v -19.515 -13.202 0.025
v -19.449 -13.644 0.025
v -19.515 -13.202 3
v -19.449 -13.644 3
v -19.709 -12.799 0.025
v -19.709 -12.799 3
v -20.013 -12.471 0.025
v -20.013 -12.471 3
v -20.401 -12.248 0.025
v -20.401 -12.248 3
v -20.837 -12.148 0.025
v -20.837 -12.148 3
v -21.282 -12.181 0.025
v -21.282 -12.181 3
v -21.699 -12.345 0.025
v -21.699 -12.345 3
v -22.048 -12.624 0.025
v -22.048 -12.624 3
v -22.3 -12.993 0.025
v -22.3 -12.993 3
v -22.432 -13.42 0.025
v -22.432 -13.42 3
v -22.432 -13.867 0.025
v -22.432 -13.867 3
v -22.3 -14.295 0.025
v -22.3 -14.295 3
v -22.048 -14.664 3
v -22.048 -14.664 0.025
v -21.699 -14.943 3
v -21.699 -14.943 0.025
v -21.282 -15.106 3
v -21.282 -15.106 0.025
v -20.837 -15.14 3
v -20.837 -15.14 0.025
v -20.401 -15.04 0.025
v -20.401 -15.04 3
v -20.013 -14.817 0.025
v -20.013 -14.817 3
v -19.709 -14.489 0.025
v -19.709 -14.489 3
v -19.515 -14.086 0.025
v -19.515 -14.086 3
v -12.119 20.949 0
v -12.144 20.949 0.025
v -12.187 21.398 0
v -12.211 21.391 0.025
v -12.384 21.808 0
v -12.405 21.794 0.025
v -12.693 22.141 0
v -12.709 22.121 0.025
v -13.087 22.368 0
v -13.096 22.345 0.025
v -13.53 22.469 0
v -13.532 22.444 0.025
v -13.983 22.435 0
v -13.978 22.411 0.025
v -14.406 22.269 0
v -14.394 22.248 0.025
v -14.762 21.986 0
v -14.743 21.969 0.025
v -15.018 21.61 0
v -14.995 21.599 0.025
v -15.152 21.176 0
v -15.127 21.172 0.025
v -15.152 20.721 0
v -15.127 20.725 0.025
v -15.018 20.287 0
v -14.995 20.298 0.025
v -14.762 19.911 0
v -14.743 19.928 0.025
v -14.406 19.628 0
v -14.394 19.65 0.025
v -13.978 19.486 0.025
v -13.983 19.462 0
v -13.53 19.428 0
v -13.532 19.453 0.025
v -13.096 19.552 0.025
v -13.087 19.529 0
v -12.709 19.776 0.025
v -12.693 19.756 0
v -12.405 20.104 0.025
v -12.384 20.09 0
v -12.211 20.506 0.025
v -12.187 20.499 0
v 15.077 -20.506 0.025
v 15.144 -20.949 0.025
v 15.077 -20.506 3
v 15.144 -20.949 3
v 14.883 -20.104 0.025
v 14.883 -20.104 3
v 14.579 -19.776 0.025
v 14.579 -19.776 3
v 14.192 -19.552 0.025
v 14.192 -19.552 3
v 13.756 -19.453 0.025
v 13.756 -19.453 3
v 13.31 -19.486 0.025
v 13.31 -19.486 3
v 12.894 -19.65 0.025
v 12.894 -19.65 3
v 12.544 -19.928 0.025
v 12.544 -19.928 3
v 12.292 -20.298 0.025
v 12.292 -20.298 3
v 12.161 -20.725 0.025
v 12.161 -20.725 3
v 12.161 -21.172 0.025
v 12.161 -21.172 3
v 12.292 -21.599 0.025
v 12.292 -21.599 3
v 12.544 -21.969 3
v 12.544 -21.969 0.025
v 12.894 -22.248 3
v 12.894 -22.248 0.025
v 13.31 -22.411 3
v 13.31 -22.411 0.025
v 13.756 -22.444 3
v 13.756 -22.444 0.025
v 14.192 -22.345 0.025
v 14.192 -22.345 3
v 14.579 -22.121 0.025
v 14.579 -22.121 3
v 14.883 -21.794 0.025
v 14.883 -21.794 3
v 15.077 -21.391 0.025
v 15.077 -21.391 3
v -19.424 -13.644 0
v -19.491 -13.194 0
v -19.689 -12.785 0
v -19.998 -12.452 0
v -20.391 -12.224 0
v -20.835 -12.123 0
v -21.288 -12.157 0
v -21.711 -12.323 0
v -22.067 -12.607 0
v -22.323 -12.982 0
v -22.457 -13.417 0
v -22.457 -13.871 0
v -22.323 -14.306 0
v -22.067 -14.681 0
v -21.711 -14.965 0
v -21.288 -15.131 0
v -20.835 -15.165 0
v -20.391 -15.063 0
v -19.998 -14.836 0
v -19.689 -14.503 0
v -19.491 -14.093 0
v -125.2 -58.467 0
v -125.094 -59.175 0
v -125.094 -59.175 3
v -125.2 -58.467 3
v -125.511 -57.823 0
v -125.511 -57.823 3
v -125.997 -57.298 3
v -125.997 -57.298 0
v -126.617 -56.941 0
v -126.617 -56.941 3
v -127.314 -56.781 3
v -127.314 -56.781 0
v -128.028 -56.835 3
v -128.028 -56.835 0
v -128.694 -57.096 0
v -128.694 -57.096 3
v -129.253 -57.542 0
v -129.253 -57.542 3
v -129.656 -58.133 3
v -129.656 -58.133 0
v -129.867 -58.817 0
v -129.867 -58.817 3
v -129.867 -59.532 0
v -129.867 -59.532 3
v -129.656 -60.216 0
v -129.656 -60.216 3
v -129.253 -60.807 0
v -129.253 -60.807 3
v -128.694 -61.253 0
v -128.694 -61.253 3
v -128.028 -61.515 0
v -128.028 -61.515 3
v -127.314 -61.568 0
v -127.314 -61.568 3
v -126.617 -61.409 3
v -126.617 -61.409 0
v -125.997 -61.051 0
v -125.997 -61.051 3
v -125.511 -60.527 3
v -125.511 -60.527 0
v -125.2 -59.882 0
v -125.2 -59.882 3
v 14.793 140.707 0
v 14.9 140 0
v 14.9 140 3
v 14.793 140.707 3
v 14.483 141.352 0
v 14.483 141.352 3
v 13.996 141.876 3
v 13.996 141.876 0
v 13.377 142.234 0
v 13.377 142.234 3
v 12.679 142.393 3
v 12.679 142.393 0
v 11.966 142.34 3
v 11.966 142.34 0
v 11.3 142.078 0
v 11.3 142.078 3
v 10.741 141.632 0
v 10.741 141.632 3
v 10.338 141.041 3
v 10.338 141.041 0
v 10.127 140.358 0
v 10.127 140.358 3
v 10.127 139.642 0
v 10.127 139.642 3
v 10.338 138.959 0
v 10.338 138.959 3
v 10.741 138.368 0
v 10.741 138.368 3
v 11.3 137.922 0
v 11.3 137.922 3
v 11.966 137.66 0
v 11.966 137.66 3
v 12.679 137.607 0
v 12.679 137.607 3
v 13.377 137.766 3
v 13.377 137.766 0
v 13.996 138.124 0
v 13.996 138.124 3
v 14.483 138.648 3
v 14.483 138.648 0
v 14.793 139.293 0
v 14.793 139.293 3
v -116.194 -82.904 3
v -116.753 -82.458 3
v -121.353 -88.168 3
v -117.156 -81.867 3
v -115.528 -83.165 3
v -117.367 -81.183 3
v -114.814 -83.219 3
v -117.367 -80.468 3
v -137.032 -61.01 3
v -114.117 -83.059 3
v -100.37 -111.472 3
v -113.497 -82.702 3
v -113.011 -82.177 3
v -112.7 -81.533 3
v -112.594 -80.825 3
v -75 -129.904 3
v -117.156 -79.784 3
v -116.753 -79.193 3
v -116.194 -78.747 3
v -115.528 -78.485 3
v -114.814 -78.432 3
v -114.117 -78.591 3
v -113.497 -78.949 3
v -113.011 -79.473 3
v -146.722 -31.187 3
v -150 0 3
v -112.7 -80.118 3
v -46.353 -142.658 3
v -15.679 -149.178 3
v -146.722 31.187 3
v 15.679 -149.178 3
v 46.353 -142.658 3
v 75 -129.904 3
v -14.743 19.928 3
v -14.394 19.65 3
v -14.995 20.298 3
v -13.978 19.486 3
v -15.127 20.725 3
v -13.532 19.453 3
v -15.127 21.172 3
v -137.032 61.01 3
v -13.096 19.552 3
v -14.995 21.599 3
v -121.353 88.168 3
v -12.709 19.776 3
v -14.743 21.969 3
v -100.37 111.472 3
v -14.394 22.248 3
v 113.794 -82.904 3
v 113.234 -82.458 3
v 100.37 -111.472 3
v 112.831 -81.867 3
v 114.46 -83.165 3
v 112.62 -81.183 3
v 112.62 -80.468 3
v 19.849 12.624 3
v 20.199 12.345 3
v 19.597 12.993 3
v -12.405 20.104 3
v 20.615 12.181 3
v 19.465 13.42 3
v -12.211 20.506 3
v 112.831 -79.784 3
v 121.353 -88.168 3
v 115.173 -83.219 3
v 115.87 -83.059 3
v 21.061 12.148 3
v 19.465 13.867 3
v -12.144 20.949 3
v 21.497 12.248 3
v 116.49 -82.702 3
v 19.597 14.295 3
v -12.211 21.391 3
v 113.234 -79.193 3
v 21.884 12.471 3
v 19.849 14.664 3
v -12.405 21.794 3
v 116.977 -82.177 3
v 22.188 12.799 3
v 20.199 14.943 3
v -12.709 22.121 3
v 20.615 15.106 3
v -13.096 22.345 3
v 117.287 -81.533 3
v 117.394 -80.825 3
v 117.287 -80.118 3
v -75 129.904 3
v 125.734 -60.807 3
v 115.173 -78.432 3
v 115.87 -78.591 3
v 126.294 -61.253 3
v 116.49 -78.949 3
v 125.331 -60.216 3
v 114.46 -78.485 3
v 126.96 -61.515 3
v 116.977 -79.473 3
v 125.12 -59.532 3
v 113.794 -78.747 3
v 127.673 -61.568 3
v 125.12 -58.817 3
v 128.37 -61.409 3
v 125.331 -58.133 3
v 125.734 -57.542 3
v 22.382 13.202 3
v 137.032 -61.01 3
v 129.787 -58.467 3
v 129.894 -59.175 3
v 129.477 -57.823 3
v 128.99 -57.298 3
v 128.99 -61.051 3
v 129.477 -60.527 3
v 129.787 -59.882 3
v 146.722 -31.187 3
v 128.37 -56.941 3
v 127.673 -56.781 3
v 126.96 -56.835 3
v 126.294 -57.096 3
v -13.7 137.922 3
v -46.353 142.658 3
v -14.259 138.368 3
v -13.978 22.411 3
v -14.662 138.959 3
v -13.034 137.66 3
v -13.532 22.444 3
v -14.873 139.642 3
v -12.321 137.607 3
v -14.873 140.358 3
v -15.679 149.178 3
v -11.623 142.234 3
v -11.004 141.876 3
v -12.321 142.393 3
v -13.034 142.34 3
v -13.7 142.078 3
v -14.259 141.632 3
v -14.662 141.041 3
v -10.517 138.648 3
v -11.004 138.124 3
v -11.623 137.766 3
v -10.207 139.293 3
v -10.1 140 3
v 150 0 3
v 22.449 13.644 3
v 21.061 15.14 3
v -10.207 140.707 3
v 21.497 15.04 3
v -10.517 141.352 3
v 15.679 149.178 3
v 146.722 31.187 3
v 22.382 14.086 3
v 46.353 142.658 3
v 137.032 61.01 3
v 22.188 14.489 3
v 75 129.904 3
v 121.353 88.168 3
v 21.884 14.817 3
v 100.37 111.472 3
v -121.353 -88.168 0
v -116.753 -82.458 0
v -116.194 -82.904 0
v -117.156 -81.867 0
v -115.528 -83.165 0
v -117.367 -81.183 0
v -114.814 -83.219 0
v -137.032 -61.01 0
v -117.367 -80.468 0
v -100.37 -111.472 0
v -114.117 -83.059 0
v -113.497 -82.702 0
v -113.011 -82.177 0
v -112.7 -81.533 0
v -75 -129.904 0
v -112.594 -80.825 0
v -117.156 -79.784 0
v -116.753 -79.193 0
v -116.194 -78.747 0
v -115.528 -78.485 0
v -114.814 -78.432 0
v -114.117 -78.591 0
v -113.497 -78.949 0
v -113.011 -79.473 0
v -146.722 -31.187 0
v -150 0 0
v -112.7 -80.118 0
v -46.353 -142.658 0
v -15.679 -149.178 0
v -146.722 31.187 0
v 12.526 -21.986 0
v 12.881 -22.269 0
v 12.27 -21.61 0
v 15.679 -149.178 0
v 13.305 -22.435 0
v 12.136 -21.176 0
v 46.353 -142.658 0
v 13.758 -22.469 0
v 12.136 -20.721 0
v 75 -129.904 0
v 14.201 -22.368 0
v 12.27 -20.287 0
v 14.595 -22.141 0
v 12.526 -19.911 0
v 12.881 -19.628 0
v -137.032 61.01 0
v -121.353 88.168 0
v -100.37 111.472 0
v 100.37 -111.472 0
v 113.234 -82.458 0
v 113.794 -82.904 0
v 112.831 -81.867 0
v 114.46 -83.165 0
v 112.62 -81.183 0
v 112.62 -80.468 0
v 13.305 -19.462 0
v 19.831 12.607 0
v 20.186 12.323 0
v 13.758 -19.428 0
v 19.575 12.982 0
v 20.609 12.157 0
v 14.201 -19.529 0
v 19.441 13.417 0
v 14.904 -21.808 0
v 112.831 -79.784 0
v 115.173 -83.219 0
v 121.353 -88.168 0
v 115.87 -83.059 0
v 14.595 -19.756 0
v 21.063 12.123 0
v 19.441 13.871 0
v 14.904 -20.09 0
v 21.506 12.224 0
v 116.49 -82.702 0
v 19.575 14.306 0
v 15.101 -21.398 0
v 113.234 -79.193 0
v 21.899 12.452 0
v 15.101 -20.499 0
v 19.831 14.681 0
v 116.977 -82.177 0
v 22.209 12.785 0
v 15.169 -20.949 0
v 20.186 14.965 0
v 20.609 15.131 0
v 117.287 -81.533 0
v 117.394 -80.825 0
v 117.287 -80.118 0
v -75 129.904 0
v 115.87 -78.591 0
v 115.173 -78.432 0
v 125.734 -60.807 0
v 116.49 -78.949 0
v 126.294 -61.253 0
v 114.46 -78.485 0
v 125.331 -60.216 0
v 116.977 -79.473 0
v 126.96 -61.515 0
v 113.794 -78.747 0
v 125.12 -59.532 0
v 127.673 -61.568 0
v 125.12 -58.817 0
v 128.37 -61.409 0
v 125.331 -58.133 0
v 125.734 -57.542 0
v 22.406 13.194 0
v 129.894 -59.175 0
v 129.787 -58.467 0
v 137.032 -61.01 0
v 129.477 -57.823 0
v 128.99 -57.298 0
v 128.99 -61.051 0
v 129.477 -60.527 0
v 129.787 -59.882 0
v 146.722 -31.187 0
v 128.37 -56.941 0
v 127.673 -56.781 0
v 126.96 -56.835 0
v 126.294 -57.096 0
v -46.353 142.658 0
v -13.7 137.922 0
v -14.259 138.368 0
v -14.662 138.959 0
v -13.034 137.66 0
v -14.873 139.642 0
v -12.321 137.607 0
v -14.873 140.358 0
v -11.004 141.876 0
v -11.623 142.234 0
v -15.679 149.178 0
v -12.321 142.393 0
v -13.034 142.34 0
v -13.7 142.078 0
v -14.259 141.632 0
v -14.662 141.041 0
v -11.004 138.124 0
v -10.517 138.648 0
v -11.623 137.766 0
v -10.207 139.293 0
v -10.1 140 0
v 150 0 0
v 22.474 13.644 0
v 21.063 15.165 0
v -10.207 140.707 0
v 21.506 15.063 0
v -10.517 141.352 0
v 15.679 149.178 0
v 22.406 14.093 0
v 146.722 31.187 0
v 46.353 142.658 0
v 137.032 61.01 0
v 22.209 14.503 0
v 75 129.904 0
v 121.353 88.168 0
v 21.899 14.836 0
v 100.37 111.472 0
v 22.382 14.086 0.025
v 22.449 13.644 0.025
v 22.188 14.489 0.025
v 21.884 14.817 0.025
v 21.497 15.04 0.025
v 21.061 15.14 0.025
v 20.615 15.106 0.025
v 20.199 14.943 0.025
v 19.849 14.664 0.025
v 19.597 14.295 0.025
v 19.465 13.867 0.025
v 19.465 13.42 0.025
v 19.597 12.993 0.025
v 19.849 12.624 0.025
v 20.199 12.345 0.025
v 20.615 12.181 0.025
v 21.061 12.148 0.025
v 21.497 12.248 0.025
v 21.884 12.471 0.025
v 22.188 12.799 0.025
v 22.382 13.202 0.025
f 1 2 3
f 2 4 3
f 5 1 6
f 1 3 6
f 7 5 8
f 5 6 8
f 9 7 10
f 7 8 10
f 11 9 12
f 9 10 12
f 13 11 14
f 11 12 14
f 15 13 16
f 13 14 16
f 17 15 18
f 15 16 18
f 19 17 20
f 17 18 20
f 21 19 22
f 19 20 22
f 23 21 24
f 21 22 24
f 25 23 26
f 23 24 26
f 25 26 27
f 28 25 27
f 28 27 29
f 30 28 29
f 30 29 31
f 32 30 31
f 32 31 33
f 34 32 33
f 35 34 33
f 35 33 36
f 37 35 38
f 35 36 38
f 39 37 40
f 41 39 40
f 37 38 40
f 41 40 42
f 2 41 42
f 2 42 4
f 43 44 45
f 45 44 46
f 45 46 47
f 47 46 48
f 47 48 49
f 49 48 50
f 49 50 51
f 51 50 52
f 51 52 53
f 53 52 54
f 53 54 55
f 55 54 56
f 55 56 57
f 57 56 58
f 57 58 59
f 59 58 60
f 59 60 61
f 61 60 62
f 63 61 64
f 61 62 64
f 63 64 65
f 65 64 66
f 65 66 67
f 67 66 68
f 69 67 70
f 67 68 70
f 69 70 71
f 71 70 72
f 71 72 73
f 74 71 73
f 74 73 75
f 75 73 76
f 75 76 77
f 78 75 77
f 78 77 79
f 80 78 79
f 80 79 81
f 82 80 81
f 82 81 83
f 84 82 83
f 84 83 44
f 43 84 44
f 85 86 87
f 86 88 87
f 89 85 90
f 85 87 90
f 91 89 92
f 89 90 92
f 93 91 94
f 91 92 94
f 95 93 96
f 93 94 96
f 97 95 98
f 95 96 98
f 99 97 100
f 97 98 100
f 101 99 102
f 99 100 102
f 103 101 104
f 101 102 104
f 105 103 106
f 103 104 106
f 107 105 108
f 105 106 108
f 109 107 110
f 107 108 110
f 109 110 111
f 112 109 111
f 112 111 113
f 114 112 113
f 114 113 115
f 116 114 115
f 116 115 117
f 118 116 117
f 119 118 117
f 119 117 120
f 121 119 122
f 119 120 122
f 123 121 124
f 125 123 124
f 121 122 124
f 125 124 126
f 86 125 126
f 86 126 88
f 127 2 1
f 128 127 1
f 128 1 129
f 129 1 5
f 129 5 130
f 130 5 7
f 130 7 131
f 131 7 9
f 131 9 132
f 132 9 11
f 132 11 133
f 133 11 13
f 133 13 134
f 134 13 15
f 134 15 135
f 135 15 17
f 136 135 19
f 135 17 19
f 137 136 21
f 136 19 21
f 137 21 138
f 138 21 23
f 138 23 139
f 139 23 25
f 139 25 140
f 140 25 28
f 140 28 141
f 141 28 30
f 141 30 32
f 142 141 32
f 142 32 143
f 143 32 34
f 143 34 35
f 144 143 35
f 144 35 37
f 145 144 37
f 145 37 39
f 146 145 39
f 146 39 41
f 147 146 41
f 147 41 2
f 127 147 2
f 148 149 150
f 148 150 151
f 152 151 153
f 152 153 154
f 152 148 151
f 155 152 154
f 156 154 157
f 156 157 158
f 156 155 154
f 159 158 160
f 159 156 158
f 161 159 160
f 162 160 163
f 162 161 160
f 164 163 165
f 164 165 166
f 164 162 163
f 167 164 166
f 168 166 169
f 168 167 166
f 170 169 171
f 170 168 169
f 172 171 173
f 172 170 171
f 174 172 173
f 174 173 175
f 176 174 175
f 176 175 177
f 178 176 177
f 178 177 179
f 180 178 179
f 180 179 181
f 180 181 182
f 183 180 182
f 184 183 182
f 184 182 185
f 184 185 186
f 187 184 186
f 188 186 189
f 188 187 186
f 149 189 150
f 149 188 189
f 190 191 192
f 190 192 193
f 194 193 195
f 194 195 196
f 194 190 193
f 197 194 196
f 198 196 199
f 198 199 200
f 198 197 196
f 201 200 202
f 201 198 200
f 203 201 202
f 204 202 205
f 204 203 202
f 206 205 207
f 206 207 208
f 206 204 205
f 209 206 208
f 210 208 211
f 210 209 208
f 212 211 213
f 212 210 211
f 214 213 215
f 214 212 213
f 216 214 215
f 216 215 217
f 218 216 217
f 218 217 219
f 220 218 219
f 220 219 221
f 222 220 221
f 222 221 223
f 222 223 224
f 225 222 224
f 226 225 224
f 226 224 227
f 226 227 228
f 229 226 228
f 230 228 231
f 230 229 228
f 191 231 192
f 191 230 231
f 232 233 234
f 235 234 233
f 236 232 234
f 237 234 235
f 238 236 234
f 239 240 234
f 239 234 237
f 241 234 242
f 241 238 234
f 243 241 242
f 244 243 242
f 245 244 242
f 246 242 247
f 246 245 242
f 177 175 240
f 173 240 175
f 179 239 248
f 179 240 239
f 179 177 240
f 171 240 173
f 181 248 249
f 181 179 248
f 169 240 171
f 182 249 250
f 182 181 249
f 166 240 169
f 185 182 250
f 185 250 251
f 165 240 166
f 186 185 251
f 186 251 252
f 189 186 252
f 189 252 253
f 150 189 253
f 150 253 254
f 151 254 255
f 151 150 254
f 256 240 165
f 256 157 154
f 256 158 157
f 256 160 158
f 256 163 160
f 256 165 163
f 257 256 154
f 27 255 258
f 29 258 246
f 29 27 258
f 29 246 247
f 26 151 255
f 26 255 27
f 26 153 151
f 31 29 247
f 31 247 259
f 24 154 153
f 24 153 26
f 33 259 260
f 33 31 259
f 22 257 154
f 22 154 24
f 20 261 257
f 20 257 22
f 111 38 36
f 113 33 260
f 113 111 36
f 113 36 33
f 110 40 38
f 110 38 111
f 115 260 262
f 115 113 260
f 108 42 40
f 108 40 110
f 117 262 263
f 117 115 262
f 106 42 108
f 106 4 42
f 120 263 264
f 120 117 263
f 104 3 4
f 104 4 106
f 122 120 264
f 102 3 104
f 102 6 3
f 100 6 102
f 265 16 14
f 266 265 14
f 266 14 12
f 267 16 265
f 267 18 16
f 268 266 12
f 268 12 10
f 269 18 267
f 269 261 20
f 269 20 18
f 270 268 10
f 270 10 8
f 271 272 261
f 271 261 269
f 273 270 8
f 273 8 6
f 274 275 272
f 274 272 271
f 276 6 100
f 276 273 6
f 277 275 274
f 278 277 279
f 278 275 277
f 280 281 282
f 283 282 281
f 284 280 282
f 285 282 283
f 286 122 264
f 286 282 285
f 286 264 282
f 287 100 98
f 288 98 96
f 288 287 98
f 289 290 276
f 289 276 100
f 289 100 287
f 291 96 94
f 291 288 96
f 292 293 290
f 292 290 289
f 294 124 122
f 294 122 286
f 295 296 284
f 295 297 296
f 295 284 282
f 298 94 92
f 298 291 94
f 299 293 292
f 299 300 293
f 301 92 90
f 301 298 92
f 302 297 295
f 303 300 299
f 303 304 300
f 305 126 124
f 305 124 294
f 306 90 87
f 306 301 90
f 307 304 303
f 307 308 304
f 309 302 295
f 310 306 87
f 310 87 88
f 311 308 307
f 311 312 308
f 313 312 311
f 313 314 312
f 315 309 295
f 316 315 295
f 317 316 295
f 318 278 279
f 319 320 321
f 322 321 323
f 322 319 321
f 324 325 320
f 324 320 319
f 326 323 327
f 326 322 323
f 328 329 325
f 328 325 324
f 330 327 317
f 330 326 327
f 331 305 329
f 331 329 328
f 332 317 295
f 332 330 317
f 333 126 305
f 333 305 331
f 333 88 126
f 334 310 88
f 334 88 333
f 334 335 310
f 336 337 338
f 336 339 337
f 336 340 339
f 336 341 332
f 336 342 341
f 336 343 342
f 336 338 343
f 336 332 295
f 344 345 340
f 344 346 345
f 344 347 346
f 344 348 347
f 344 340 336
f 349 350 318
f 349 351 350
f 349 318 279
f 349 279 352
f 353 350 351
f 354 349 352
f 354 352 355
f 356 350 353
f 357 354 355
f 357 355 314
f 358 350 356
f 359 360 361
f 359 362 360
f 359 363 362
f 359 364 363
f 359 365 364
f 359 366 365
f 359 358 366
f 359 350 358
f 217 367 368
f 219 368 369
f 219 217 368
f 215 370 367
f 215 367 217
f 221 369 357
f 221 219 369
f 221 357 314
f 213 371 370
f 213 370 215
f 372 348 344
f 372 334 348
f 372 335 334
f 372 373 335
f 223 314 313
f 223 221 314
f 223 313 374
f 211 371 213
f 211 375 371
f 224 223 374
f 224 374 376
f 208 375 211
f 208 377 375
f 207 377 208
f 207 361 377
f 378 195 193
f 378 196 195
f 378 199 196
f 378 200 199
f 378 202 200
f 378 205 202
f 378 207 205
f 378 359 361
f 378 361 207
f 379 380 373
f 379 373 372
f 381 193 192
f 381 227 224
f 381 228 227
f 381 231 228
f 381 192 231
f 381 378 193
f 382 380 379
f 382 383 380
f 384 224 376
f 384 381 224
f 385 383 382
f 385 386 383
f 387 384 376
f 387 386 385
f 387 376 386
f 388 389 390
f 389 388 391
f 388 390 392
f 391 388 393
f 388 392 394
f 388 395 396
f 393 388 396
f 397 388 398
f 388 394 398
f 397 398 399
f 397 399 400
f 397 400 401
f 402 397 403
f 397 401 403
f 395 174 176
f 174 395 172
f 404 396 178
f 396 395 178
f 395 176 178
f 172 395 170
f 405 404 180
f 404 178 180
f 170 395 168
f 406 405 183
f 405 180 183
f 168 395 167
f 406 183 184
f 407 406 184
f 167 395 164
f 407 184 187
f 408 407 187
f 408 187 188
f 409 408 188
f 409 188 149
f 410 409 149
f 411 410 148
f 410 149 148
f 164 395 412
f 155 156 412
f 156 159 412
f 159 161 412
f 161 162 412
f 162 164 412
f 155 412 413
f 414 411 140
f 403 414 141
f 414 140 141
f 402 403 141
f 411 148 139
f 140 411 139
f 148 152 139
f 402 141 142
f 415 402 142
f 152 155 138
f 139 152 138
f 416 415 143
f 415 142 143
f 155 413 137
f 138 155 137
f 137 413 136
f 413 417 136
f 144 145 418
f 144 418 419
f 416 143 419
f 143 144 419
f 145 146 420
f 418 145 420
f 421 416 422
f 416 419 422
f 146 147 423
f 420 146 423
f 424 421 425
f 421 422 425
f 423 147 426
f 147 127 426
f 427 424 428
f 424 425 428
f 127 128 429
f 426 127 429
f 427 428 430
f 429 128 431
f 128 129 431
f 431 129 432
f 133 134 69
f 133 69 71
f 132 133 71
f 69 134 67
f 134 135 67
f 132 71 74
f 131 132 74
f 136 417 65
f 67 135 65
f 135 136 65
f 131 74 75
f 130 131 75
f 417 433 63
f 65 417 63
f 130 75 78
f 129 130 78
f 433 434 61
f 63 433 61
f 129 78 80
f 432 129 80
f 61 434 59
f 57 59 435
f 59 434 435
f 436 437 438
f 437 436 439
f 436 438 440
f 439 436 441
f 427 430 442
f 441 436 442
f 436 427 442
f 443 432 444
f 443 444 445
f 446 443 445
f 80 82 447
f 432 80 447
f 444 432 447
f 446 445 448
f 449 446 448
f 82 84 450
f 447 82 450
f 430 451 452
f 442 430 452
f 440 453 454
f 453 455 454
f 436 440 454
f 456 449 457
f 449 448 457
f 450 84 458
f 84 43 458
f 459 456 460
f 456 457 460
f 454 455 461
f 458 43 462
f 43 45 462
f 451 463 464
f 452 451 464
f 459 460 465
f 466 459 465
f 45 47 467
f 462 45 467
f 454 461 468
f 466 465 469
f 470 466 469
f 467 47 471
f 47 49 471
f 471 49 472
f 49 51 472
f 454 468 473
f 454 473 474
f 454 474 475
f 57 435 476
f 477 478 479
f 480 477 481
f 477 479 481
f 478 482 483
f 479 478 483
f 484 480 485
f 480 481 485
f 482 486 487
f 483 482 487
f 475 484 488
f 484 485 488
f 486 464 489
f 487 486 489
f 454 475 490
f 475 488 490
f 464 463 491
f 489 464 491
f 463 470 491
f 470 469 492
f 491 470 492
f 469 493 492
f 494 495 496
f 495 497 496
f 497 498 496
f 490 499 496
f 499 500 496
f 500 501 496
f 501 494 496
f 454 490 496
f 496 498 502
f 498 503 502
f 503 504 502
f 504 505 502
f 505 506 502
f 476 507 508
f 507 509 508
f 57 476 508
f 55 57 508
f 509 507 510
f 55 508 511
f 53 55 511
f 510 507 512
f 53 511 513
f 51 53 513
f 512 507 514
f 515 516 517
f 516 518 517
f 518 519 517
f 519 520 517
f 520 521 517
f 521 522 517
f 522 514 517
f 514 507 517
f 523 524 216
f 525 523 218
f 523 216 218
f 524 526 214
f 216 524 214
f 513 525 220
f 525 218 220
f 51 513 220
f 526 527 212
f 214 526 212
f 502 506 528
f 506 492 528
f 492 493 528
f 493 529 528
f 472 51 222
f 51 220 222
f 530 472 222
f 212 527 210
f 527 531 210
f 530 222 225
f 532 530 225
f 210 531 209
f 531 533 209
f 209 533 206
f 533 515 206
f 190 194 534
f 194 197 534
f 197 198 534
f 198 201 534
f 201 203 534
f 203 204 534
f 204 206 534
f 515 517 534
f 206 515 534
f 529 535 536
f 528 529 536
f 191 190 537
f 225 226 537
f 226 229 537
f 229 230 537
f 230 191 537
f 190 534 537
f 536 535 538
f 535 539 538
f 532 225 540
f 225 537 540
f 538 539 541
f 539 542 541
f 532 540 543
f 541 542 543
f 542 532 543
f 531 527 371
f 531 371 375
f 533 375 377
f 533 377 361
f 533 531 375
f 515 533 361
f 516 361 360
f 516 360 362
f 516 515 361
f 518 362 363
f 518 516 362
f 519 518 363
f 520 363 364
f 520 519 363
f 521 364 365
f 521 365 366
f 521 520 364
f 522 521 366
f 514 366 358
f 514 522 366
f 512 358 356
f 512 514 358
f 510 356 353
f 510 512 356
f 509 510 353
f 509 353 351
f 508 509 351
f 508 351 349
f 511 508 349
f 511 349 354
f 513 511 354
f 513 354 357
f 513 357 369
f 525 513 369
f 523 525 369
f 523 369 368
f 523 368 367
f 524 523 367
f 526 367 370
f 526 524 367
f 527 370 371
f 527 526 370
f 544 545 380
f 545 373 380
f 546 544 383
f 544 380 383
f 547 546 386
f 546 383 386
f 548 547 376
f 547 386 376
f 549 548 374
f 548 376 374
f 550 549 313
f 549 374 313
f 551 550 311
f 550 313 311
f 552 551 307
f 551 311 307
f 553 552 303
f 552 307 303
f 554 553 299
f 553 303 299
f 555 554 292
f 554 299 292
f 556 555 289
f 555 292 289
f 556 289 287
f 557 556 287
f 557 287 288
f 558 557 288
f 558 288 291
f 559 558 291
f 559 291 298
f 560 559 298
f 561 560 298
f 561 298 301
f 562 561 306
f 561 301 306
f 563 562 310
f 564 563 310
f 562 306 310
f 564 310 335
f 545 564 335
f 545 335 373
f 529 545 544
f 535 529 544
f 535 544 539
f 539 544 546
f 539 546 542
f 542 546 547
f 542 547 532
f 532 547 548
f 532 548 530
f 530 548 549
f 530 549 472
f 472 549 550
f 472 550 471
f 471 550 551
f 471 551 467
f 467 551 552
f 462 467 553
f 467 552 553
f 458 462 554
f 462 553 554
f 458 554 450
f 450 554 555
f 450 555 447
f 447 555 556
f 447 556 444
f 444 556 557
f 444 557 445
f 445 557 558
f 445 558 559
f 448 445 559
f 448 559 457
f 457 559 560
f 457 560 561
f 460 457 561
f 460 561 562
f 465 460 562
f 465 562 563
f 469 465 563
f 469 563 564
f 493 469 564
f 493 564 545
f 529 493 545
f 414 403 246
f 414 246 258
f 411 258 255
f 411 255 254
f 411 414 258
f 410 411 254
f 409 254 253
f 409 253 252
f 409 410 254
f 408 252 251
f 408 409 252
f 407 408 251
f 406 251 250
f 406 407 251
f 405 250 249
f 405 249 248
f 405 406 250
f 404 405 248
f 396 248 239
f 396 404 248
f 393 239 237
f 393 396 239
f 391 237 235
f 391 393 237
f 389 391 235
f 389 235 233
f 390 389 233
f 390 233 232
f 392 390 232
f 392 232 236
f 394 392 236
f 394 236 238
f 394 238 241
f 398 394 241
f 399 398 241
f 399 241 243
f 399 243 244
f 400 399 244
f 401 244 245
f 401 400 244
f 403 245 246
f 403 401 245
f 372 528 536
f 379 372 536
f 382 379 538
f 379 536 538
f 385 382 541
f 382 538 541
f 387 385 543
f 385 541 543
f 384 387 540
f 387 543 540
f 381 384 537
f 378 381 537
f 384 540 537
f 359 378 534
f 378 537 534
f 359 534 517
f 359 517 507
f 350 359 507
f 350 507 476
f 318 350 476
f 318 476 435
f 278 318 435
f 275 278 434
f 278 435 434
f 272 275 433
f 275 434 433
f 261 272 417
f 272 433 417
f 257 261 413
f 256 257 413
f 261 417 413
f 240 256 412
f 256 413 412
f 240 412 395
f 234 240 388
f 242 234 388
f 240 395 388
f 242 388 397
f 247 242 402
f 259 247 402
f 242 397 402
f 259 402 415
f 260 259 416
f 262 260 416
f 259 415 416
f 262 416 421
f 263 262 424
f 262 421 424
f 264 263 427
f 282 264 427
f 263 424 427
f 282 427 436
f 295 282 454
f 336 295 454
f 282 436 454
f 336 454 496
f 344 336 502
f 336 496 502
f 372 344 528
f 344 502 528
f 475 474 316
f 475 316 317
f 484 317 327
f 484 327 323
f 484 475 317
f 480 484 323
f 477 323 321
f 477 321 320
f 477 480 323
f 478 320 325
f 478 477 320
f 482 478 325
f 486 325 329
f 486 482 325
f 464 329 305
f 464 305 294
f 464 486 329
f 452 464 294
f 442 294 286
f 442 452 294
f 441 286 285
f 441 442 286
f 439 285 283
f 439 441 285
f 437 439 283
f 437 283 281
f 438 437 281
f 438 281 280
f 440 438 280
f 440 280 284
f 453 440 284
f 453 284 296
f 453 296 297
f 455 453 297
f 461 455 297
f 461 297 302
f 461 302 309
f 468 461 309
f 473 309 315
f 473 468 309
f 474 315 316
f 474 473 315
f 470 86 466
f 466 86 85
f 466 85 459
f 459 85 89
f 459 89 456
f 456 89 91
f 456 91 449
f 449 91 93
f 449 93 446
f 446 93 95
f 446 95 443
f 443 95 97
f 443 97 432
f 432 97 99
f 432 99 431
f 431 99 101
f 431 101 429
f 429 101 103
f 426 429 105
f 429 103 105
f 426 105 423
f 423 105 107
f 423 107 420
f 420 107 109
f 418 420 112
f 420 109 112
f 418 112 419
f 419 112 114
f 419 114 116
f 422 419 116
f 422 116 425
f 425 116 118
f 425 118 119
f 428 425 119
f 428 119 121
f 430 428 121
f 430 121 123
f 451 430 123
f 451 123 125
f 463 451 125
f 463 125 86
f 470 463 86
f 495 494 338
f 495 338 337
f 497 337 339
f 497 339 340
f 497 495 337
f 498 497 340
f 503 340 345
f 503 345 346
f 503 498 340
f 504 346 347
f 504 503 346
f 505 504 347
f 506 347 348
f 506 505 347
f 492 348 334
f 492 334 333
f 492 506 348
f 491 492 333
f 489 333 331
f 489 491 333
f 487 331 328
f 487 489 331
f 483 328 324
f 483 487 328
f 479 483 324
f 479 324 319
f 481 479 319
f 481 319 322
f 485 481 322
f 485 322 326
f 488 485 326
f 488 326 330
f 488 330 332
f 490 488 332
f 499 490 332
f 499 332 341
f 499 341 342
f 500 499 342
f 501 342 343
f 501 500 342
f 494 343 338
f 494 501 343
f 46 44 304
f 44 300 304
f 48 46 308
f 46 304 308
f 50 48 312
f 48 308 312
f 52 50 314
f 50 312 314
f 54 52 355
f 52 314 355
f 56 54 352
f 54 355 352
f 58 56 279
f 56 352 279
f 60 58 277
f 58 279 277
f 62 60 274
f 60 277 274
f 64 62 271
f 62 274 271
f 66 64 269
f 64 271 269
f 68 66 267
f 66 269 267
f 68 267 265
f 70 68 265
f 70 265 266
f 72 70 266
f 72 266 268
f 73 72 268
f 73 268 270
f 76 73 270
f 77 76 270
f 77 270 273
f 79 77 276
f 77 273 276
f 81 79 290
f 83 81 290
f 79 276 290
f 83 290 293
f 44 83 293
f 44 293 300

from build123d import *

# Parameters (mm, degrees)
SKETCH1_R                       = 150
SKETCH1_R_2                     = 2.4
BOSS_EXTRUDE2_DEPTH             = 3
F_3_0MM_DOWEL_HOLE2_D           = 3
F_3_0MM_DOWEL_HOLE2_CSINK_D     = 3.05
F_3_0MM_DOWEL_HOLE2_CSINK_ANGLE = 90


with BuildPart() as part:
    # Sketch1 → Boss-Extrude2 (new body)
    with BuildSketch(Plane.XY):
        Circle(SKETCH1_R)
        with Locations((12.5, 140)):
            Circle(SKETCH1_R_2, mode=Mode.SUBTRACT)
        with Locations((-12.5, 140)):
            Circle(SKETCH1_R_2, mode=Mode.SUBTRACT)
        with Locations((127.49355653, -59.174682453)):
            Circle(SKETCH1_R_2, mode=Mode.SUBTRACT)
        with Locations((114.99355653, -80.825317547)):
            Circle(SKETCH1_R_2, mode=Mode.SUBTRACT)
        with Locations((-114.99355653, -80.825317547)):
            Circle(SKETCH1_R_2, mode=Mode.SUBTRACT)
        with Locations((-127.49355653, -59.174682453)):
            Circle(SKETCH1_R_2, mode=Mode.SUBTRACT)
    extrude(amount=BOSS_EXTRUDE2_DEPTH)

    # Ø3.0mm Dowel Hole2 (through all)
    with Locations(Plane(origin=(0, 0, 0), x_dir=(-1, 0, 0), z_dir=(0, 0, -1))):
        with Locations((-20.948618644, 13.643876902), (13.643876902, 20.948618644), (20.948618644, -13.643876902), (-13.643876902, -20.948618644)):
            CounterSinkHole(F_3_0MM_DOWEL_HOLE2_D / 2, F_3_0MM_DOWEL_HOLE2_CSINK_D / 2, counter_sink_angle=F_3_0MM_DOWEL_HOLE2_CSINK_ANGLE)


solid = part.part
